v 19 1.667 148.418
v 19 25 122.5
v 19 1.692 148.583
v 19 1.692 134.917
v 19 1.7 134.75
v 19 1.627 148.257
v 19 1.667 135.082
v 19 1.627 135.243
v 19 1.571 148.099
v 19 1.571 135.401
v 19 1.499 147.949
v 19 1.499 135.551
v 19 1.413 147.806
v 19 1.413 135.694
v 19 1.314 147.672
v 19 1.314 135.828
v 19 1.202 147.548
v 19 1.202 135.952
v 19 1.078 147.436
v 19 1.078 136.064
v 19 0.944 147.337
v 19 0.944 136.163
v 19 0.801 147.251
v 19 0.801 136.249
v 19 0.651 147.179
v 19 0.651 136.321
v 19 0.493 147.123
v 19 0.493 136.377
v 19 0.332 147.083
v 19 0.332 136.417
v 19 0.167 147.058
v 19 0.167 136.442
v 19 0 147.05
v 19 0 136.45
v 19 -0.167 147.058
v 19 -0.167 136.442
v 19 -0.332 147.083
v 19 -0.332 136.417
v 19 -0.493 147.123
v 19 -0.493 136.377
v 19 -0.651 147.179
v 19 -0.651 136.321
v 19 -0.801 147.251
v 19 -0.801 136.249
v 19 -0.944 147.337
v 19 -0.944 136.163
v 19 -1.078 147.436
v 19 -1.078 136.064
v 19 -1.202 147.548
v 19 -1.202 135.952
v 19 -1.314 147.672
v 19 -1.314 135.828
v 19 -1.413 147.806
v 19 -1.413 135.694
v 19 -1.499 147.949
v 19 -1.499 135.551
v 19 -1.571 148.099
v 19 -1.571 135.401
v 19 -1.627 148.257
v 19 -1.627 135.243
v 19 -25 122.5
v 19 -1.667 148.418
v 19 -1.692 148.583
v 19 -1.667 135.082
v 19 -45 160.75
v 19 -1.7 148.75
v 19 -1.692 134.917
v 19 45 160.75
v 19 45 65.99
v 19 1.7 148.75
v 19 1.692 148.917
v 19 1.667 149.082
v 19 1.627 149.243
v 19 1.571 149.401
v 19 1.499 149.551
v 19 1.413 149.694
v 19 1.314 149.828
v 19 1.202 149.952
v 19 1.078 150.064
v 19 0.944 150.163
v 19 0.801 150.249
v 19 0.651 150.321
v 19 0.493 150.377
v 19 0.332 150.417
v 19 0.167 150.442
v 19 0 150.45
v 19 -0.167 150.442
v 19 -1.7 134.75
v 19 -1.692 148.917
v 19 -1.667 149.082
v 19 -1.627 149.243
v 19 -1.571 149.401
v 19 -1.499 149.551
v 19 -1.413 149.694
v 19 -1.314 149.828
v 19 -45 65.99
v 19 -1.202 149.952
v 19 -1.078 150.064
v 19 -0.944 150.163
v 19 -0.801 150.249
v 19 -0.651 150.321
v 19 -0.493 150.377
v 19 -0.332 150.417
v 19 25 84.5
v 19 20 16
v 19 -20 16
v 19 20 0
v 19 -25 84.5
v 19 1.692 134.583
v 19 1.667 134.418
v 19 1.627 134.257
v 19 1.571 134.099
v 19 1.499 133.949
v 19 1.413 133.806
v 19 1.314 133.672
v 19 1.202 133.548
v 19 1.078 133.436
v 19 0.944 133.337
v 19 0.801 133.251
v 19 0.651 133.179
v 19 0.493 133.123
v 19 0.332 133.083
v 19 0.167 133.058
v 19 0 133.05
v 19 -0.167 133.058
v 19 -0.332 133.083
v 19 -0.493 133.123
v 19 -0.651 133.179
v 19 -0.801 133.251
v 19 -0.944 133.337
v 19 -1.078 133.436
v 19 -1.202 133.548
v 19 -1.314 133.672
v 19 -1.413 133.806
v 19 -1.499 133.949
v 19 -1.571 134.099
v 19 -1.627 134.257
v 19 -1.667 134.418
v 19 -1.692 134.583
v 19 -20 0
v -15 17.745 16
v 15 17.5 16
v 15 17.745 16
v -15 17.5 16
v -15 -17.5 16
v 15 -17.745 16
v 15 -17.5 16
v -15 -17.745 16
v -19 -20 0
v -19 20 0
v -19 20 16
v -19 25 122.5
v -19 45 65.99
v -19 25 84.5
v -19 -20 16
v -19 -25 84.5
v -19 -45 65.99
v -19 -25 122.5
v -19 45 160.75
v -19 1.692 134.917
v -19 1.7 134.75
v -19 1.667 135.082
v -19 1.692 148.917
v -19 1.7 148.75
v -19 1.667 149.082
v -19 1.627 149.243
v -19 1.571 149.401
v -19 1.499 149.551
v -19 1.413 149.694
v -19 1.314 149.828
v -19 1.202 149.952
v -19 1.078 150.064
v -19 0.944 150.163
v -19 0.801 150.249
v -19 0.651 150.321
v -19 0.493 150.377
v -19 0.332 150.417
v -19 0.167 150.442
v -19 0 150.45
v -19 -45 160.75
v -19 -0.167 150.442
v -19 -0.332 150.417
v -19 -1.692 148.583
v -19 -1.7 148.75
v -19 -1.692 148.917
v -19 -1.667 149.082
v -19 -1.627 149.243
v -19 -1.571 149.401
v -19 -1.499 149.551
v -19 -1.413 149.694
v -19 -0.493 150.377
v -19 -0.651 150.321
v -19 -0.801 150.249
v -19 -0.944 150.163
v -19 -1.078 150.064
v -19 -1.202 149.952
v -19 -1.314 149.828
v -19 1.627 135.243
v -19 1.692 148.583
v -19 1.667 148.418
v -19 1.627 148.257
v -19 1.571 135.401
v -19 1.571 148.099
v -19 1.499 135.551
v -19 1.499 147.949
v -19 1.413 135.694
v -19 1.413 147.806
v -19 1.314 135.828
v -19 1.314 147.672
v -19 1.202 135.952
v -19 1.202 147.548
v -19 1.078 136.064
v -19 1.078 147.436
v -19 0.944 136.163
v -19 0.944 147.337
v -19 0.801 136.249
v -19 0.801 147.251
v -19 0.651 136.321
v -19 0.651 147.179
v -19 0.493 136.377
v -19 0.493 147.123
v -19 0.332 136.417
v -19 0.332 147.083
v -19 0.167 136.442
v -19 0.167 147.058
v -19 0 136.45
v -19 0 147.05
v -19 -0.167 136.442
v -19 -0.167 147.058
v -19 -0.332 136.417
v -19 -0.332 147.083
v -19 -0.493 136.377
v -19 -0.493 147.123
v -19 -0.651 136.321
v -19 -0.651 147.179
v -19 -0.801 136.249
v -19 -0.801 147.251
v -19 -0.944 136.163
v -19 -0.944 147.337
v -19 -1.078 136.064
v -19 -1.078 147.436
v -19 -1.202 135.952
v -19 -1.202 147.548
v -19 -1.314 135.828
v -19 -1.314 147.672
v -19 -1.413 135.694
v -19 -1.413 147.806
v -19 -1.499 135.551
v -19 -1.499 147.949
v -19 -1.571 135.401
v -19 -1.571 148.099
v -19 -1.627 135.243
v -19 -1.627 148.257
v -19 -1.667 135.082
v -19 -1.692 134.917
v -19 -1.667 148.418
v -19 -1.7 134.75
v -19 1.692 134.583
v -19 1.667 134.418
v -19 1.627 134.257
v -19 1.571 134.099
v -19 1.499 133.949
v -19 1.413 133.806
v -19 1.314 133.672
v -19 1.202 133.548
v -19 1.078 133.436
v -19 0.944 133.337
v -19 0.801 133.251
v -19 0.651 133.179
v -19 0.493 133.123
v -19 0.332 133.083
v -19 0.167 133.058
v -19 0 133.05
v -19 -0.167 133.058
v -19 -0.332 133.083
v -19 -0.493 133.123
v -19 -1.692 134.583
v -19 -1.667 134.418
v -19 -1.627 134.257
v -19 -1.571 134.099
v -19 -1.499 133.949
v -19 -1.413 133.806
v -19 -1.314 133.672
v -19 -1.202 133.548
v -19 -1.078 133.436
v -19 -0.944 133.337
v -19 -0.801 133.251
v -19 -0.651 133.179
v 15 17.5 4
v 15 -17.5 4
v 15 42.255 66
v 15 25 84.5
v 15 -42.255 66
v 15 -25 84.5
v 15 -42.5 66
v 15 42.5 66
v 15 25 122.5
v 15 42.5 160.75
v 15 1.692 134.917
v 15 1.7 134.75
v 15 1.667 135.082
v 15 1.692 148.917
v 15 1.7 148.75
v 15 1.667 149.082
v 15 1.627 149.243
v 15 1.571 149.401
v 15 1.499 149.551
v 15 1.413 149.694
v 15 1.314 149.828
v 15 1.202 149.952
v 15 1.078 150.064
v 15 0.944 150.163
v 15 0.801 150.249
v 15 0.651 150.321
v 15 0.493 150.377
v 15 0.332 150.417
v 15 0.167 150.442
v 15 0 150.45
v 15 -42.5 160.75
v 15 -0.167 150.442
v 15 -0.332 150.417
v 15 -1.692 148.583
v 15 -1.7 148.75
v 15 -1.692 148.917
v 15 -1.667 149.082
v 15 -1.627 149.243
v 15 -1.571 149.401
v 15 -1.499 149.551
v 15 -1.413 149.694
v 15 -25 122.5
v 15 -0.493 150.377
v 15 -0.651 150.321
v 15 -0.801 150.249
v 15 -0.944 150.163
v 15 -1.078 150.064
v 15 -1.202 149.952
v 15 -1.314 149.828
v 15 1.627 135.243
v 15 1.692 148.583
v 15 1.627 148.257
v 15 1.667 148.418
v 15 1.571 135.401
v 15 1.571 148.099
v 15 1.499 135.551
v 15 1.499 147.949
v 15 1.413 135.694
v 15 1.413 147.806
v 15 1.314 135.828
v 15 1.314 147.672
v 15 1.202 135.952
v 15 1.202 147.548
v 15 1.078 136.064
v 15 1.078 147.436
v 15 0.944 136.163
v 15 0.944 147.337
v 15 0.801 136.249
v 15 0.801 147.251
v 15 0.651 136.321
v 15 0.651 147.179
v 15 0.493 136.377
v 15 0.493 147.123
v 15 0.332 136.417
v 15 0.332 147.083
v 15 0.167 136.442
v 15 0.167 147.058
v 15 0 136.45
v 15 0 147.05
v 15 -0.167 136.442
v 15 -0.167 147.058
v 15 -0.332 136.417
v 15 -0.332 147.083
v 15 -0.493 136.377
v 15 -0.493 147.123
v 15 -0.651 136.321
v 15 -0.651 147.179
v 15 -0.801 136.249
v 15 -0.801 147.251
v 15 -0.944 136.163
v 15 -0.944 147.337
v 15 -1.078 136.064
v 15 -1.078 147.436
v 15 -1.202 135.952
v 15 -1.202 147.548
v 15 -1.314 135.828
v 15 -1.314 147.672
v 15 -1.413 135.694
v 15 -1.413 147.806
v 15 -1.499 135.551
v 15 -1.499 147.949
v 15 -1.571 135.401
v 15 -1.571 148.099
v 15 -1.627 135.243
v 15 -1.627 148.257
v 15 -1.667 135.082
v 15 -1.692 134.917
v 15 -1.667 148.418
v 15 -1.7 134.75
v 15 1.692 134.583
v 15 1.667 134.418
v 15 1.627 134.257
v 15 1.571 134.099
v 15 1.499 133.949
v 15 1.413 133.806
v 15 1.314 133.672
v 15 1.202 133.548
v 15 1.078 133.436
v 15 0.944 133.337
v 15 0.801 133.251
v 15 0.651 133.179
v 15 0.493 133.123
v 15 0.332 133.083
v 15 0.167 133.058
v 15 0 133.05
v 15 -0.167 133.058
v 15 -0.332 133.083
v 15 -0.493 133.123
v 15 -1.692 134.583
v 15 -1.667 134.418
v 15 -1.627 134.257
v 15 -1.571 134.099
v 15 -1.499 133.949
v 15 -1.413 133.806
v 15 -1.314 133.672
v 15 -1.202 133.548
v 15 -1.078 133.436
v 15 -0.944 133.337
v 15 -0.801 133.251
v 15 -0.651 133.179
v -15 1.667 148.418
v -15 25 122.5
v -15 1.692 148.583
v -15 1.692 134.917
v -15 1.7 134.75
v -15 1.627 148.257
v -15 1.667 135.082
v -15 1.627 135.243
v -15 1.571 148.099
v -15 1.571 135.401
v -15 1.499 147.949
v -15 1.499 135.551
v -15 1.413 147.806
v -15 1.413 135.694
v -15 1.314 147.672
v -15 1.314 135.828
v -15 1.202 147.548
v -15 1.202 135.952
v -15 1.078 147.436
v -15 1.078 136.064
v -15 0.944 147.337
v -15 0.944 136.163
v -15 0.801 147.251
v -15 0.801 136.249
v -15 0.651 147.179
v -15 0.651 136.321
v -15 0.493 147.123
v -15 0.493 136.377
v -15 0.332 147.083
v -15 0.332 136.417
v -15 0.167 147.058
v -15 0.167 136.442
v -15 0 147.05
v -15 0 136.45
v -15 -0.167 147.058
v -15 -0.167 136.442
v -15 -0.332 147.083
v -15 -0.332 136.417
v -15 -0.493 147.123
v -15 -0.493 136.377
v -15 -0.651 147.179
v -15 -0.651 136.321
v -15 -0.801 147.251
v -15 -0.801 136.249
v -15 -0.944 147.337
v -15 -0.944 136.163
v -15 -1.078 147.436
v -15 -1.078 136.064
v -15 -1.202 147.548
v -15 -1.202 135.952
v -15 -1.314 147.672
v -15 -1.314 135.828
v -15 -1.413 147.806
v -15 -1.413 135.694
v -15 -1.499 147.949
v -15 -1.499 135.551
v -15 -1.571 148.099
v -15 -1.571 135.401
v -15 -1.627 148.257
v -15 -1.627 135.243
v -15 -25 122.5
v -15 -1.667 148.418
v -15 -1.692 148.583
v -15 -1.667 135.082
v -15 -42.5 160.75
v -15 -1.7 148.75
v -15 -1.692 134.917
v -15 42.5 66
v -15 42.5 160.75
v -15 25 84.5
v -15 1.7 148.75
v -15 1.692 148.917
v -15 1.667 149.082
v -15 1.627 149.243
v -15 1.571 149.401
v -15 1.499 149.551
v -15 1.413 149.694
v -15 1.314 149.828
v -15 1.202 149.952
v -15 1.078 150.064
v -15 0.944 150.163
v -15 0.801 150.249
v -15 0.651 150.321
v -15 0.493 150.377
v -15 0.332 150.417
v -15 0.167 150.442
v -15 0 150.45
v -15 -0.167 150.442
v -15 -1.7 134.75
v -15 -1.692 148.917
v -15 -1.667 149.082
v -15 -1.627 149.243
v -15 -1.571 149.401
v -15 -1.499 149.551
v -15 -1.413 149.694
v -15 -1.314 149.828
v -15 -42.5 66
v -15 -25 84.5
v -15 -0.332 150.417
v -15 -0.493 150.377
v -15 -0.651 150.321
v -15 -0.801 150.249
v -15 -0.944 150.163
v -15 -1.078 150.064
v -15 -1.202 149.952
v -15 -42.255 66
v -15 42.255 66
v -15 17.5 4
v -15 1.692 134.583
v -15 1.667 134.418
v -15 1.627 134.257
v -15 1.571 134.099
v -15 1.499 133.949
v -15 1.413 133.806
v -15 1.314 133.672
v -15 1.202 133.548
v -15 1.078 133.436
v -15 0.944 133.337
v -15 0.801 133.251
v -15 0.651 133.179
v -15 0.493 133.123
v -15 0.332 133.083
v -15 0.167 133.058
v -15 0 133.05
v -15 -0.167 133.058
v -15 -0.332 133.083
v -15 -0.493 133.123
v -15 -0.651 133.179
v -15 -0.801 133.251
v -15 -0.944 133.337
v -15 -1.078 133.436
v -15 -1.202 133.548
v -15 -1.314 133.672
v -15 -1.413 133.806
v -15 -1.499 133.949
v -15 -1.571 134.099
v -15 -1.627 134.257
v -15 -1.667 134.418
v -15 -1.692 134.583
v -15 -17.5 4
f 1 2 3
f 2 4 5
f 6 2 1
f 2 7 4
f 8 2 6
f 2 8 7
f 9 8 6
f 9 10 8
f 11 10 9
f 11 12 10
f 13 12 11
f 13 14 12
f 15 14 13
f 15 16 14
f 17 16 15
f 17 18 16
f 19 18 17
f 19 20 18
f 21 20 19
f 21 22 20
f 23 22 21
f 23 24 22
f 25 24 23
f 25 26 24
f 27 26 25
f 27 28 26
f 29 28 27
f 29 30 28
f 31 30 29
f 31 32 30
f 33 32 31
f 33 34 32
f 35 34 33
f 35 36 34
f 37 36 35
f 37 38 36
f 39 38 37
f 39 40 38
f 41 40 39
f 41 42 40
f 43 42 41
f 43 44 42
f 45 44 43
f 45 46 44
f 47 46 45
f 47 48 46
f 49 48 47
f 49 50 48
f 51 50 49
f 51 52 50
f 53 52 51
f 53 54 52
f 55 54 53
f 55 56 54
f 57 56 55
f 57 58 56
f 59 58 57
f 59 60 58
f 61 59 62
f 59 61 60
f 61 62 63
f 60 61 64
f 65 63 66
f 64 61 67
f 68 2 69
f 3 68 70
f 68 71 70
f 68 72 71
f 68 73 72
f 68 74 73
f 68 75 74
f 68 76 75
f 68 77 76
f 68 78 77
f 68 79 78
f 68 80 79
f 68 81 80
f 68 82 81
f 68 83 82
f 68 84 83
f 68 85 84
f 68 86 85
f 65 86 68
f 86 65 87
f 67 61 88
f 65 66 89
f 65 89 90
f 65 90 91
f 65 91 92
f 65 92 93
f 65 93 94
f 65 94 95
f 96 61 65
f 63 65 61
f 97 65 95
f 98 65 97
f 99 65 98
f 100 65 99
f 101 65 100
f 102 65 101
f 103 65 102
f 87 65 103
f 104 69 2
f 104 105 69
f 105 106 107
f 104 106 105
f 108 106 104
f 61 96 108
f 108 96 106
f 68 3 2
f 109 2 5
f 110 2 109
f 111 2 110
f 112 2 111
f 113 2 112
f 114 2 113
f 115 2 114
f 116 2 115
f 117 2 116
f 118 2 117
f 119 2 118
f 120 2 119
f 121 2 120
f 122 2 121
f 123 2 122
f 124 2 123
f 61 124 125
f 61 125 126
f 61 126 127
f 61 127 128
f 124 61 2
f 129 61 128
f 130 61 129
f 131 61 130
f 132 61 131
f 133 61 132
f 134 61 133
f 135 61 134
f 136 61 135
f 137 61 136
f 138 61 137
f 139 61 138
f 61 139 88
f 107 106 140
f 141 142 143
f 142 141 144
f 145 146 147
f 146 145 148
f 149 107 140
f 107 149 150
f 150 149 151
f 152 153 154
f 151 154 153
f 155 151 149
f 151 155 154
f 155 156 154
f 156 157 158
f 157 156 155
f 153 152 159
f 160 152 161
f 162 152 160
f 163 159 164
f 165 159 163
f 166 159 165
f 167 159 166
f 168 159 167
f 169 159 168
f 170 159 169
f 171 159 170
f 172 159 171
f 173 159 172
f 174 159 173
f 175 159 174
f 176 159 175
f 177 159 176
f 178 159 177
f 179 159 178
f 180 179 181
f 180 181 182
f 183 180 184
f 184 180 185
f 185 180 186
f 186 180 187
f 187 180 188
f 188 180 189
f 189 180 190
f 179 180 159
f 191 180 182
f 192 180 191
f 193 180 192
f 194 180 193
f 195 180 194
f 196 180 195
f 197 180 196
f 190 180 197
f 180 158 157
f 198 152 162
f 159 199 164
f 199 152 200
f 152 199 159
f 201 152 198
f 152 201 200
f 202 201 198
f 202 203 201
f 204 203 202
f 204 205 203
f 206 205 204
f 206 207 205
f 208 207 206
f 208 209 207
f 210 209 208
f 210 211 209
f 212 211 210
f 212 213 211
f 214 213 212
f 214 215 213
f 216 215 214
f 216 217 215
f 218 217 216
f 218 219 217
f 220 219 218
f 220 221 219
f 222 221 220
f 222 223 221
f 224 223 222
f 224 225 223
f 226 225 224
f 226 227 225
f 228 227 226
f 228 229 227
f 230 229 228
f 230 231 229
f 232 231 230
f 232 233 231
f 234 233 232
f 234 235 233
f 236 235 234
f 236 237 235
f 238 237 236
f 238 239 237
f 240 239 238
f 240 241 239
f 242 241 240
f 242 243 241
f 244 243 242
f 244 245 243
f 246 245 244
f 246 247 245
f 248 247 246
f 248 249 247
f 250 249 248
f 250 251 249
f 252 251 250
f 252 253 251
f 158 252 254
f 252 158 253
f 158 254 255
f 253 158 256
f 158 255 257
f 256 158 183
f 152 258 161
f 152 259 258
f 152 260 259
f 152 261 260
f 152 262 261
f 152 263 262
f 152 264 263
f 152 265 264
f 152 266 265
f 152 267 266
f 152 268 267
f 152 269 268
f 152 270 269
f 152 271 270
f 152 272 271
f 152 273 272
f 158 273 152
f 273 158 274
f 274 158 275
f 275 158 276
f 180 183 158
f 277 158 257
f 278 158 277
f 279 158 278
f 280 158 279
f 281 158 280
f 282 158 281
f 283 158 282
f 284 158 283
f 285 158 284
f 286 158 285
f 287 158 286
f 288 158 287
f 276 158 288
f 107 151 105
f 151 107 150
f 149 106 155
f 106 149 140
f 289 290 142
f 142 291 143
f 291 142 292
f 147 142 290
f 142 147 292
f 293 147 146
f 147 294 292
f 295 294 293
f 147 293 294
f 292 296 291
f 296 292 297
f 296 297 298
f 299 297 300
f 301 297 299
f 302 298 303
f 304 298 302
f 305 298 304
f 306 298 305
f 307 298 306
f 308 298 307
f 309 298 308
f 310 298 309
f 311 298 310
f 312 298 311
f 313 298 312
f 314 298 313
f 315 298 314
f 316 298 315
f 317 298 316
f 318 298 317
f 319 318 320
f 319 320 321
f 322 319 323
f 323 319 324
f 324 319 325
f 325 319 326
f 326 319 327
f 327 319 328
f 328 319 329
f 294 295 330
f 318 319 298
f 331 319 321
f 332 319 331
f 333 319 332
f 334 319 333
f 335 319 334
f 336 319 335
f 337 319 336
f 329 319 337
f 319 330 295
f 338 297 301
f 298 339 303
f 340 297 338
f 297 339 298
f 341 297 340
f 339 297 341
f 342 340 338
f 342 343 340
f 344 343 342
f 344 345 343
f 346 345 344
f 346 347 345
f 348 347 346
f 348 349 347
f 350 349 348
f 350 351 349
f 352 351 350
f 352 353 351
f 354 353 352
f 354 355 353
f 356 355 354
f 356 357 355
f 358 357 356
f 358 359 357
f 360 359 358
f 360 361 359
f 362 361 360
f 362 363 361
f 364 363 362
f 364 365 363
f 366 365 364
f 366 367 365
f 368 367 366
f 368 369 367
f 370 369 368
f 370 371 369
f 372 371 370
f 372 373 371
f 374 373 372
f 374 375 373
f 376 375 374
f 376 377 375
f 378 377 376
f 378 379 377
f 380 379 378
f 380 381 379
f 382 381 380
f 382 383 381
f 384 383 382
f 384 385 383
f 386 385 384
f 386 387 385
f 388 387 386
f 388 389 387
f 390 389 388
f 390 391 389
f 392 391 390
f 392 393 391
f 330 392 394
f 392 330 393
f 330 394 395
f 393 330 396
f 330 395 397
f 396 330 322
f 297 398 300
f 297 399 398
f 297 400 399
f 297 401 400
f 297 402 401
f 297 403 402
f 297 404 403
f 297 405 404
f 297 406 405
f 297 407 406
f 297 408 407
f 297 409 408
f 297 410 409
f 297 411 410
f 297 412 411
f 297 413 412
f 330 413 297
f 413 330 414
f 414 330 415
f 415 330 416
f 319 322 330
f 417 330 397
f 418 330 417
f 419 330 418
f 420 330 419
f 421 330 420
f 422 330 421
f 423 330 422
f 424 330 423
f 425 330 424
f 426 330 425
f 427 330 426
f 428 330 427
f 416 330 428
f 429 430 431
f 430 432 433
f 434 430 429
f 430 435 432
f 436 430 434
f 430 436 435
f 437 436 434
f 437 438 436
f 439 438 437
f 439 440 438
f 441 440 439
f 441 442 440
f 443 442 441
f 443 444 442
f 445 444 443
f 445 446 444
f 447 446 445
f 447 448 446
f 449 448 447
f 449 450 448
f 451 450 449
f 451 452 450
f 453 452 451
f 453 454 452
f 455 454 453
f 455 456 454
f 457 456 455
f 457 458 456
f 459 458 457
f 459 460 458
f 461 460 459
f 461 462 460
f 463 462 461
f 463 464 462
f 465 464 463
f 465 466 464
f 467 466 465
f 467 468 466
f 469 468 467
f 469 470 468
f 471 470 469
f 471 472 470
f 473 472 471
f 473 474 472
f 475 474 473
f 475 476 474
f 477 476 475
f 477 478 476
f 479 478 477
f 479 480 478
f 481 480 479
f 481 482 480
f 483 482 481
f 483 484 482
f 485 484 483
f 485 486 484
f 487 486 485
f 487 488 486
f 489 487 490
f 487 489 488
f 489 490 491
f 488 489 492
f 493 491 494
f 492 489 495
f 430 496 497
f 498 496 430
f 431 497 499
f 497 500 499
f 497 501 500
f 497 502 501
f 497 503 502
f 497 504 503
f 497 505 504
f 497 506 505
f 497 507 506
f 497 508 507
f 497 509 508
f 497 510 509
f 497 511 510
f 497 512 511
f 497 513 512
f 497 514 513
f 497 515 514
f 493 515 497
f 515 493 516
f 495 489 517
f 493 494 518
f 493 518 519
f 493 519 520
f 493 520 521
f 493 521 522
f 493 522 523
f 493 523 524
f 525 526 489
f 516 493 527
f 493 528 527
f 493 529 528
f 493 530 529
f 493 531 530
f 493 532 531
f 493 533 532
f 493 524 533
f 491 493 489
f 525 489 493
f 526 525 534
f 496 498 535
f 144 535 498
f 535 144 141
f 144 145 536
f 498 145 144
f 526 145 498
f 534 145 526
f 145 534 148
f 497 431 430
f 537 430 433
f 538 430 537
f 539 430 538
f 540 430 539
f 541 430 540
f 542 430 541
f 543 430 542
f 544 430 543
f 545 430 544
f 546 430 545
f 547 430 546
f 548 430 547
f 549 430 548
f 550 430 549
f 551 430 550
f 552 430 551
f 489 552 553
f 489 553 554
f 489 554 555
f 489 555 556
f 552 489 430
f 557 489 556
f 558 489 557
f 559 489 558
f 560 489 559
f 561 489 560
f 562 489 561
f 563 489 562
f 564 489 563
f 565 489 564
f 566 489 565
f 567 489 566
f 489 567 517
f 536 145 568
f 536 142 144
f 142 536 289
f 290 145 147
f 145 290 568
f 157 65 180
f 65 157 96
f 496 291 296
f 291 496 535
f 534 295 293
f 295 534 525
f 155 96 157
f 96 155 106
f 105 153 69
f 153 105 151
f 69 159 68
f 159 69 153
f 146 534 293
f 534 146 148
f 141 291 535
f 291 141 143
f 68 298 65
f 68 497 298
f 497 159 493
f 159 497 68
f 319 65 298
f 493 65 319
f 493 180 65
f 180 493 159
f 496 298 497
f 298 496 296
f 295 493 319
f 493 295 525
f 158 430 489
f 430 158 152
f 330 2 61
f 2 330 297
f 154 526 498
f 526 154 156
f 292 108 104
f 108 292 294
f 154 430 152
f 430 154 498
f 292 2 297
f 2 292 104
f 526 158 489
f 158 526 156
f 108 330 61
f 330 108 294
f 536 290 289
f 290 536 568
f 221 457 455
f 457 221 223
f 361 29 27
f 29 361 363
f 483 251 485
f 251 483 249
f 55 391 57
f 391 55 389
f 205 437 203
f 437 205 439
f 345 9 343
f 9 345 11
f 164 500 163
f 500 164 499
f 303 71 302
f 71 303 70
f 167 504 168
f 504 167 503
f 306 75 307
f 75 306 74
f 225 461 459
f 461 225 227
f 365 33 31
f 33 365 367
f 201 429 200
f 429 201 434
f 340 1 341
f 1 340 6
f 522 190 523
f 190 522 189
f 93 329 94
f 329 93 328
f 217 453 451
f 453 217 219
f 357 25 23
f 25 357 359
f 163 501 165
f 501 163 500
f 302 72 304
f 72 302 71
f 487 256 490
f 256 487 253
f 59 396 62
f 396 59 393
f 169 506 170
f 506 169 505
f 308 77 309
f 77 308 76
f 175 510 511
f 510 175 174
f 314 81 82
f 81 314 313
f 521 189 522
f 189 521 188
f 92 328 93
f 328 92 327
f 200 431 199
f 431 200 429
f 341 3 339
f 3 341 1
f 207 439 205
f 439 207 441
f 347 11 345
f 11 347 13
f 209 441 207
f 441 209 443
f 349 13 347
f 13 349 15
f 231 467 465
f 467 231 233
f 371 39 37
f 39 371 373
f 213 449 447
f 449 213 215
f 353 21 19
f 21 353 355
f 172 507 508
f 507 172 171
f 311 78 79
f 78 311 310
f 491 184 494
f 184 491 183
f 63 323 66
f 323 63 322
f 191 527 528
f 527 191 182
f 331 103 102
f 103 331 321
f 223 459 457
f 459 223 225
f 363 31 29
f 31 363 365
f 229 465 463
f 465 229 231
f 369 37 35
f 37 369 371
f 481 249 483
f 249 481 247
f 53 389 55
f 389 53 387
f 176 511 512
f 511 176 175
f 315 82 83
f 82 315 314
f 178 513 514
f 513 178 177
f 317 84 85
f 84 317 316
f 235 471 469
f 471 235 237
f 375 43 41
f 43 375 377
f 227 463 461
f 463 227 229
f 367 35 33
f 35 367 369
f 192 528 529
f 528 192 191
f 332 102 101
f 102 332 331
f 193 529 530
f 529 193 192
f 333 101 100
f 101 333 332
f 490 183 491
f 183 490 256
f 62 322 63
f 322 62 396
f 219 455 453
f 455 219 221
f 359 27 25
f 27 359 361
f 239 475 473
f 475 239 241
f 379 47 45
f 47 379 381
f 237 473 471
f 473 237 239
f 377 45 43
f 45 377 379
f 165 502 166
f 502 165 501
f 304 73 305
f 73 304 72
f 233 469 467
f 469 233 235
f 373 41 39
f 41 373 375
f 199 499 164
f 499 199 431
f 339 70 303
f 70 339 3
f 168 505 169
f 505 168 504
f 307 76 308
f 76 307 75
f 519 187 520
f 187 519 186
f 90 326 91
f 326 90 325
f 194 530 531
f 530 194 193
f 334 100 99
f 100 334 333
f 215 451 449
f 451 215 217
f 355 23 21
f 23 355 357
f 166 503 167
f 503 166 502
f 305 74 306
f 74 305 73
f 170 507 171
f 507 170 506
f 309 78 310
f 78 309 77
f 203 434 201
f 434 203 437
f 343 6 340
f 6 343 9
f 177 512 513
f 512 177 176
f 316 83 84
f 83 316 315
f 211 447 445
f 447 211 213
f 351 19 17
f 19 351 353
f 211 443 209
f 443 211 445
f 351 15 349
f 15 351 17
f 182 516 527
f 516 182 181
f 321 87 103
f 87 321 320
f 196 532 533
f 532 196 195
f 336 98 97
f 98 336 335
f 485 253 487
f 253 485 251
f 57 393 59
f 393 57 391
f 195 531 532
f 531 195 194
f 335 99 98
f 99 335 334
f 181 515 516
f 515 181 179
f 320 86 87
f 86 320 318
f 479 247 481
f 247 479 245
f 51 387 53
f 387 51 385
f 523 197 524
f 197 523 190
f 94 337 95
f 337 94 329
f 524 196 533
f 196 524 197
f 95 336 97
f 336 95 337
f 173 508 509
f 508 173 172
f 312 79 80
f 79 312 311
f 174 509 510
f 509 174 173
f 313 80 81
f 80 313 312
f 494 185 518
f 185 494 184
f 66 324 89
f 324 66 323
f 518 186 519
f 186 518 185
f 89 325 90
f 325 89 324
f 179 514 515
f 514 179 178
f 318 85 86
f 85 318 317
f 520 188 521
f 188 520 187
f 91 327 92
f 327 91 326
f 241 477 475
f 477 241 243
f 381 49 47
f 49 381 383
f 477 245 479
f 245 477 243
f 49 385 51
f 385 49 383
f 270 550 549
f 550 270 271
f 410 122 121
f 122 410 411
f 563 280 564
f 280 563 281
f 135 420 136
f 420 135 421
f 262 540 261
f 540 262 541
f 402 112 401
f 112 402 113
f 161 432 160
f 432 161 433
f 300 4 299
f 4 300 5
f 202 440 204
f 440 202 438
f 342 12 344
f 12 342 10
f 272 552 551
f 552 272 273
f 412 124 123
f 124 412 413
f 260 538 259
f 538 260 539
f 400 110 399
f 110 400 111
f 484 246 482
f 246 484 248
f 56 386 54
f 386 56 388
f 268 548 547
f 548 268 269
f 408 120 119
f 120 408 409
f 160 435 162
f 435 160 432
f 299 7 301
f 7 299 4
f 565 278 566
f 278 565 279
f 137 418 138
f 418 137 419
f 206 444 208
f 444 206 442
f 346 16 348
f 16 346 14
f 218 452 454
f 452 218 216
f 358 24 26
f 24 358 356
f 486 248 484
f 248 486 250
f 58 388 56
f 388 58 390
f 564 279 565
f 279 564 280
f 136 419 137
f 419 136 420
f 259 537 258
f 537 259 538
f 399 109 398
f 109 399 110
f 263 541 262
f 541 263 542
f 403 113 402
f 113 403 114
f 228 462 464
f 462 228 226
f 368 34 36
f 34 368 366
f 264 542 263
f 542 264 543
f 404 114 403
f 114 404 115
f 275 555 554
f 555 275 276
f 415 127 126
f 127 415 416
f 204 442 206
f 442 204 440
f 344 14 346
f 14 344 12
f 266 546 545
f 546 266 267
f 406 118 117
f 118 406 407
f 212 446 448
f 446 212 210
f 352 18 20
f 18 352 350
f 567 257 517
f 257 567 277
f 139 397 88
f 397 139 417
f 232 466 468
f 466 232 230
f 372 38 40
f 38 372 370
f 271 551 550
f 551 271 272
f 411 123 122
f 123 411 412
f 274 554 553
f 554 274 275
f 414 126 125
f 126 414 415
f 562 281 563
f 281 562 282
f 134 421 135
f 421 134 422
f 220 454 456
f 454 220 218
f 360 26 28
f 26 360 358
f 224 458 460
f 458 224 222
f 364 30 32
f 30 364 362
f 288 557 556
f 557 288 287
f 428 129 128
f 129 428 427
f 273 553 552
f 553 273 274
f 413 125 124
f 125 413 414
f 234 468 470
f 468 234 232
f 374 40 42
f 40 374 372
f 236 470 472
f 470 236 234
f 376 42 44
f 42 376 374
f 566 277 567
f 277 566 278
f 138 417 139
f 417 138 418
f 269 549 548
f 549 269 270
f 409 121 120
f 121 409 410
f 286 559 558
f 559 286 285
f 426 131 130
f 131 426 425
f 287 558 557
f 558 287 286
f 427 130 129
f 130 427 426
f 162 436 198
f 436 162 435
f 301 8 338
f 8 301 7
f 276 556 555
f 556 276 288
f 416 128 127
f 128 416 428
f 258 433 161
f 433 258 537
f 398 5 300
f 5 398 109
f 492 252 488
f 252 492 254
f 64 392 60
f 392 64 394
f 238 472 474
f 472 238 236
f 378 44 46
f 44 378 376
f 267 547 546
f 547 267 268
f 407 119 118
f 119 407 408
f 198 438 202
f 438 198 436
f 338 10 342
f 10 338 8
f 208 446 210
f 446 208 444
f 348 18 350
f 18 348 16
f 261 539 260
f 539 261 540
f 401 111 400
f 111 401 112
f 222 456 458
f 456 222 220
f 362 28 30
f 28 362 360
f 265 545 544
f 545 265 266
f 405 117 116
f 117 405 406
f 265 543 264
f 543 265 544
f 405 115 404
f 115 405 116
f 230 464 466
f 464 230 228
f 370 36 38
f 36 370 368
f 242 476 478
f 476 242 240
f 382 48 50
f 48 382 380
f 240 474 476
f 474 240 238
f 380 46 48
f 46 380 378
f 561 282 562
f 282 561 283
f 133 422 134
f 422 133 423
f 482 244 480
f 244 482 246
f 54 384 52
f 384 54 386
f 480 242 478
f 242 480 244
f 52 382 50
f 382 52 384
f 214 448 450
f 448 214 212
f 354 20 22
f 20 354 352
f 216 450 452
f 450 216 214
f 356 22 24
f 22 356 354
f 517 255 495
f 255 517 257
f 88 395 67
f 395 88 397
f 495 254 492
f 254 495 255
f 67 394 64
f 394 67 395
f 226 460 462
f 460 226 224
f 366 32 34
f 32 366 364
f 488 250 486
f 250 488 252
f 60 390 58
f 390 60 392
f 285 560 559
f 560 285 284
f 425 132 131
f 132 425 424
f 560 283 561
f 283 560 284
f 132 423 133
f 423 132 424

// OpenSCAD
// Standalone robot upper body A piece (S101 cap -> splice, taper to 80).
// Edit shared dimensions in frame_v4.scad so the assembly and this part stay linked.
// Print UPRIGHT as placed (~161 tall).

part_mode = "upper_body_a";
part_cutaway = false;     // true removes a corner quarter to inspect the box interior
print_export = true;      // use high quality $fn for STL export

include <frame_v4.scad>
